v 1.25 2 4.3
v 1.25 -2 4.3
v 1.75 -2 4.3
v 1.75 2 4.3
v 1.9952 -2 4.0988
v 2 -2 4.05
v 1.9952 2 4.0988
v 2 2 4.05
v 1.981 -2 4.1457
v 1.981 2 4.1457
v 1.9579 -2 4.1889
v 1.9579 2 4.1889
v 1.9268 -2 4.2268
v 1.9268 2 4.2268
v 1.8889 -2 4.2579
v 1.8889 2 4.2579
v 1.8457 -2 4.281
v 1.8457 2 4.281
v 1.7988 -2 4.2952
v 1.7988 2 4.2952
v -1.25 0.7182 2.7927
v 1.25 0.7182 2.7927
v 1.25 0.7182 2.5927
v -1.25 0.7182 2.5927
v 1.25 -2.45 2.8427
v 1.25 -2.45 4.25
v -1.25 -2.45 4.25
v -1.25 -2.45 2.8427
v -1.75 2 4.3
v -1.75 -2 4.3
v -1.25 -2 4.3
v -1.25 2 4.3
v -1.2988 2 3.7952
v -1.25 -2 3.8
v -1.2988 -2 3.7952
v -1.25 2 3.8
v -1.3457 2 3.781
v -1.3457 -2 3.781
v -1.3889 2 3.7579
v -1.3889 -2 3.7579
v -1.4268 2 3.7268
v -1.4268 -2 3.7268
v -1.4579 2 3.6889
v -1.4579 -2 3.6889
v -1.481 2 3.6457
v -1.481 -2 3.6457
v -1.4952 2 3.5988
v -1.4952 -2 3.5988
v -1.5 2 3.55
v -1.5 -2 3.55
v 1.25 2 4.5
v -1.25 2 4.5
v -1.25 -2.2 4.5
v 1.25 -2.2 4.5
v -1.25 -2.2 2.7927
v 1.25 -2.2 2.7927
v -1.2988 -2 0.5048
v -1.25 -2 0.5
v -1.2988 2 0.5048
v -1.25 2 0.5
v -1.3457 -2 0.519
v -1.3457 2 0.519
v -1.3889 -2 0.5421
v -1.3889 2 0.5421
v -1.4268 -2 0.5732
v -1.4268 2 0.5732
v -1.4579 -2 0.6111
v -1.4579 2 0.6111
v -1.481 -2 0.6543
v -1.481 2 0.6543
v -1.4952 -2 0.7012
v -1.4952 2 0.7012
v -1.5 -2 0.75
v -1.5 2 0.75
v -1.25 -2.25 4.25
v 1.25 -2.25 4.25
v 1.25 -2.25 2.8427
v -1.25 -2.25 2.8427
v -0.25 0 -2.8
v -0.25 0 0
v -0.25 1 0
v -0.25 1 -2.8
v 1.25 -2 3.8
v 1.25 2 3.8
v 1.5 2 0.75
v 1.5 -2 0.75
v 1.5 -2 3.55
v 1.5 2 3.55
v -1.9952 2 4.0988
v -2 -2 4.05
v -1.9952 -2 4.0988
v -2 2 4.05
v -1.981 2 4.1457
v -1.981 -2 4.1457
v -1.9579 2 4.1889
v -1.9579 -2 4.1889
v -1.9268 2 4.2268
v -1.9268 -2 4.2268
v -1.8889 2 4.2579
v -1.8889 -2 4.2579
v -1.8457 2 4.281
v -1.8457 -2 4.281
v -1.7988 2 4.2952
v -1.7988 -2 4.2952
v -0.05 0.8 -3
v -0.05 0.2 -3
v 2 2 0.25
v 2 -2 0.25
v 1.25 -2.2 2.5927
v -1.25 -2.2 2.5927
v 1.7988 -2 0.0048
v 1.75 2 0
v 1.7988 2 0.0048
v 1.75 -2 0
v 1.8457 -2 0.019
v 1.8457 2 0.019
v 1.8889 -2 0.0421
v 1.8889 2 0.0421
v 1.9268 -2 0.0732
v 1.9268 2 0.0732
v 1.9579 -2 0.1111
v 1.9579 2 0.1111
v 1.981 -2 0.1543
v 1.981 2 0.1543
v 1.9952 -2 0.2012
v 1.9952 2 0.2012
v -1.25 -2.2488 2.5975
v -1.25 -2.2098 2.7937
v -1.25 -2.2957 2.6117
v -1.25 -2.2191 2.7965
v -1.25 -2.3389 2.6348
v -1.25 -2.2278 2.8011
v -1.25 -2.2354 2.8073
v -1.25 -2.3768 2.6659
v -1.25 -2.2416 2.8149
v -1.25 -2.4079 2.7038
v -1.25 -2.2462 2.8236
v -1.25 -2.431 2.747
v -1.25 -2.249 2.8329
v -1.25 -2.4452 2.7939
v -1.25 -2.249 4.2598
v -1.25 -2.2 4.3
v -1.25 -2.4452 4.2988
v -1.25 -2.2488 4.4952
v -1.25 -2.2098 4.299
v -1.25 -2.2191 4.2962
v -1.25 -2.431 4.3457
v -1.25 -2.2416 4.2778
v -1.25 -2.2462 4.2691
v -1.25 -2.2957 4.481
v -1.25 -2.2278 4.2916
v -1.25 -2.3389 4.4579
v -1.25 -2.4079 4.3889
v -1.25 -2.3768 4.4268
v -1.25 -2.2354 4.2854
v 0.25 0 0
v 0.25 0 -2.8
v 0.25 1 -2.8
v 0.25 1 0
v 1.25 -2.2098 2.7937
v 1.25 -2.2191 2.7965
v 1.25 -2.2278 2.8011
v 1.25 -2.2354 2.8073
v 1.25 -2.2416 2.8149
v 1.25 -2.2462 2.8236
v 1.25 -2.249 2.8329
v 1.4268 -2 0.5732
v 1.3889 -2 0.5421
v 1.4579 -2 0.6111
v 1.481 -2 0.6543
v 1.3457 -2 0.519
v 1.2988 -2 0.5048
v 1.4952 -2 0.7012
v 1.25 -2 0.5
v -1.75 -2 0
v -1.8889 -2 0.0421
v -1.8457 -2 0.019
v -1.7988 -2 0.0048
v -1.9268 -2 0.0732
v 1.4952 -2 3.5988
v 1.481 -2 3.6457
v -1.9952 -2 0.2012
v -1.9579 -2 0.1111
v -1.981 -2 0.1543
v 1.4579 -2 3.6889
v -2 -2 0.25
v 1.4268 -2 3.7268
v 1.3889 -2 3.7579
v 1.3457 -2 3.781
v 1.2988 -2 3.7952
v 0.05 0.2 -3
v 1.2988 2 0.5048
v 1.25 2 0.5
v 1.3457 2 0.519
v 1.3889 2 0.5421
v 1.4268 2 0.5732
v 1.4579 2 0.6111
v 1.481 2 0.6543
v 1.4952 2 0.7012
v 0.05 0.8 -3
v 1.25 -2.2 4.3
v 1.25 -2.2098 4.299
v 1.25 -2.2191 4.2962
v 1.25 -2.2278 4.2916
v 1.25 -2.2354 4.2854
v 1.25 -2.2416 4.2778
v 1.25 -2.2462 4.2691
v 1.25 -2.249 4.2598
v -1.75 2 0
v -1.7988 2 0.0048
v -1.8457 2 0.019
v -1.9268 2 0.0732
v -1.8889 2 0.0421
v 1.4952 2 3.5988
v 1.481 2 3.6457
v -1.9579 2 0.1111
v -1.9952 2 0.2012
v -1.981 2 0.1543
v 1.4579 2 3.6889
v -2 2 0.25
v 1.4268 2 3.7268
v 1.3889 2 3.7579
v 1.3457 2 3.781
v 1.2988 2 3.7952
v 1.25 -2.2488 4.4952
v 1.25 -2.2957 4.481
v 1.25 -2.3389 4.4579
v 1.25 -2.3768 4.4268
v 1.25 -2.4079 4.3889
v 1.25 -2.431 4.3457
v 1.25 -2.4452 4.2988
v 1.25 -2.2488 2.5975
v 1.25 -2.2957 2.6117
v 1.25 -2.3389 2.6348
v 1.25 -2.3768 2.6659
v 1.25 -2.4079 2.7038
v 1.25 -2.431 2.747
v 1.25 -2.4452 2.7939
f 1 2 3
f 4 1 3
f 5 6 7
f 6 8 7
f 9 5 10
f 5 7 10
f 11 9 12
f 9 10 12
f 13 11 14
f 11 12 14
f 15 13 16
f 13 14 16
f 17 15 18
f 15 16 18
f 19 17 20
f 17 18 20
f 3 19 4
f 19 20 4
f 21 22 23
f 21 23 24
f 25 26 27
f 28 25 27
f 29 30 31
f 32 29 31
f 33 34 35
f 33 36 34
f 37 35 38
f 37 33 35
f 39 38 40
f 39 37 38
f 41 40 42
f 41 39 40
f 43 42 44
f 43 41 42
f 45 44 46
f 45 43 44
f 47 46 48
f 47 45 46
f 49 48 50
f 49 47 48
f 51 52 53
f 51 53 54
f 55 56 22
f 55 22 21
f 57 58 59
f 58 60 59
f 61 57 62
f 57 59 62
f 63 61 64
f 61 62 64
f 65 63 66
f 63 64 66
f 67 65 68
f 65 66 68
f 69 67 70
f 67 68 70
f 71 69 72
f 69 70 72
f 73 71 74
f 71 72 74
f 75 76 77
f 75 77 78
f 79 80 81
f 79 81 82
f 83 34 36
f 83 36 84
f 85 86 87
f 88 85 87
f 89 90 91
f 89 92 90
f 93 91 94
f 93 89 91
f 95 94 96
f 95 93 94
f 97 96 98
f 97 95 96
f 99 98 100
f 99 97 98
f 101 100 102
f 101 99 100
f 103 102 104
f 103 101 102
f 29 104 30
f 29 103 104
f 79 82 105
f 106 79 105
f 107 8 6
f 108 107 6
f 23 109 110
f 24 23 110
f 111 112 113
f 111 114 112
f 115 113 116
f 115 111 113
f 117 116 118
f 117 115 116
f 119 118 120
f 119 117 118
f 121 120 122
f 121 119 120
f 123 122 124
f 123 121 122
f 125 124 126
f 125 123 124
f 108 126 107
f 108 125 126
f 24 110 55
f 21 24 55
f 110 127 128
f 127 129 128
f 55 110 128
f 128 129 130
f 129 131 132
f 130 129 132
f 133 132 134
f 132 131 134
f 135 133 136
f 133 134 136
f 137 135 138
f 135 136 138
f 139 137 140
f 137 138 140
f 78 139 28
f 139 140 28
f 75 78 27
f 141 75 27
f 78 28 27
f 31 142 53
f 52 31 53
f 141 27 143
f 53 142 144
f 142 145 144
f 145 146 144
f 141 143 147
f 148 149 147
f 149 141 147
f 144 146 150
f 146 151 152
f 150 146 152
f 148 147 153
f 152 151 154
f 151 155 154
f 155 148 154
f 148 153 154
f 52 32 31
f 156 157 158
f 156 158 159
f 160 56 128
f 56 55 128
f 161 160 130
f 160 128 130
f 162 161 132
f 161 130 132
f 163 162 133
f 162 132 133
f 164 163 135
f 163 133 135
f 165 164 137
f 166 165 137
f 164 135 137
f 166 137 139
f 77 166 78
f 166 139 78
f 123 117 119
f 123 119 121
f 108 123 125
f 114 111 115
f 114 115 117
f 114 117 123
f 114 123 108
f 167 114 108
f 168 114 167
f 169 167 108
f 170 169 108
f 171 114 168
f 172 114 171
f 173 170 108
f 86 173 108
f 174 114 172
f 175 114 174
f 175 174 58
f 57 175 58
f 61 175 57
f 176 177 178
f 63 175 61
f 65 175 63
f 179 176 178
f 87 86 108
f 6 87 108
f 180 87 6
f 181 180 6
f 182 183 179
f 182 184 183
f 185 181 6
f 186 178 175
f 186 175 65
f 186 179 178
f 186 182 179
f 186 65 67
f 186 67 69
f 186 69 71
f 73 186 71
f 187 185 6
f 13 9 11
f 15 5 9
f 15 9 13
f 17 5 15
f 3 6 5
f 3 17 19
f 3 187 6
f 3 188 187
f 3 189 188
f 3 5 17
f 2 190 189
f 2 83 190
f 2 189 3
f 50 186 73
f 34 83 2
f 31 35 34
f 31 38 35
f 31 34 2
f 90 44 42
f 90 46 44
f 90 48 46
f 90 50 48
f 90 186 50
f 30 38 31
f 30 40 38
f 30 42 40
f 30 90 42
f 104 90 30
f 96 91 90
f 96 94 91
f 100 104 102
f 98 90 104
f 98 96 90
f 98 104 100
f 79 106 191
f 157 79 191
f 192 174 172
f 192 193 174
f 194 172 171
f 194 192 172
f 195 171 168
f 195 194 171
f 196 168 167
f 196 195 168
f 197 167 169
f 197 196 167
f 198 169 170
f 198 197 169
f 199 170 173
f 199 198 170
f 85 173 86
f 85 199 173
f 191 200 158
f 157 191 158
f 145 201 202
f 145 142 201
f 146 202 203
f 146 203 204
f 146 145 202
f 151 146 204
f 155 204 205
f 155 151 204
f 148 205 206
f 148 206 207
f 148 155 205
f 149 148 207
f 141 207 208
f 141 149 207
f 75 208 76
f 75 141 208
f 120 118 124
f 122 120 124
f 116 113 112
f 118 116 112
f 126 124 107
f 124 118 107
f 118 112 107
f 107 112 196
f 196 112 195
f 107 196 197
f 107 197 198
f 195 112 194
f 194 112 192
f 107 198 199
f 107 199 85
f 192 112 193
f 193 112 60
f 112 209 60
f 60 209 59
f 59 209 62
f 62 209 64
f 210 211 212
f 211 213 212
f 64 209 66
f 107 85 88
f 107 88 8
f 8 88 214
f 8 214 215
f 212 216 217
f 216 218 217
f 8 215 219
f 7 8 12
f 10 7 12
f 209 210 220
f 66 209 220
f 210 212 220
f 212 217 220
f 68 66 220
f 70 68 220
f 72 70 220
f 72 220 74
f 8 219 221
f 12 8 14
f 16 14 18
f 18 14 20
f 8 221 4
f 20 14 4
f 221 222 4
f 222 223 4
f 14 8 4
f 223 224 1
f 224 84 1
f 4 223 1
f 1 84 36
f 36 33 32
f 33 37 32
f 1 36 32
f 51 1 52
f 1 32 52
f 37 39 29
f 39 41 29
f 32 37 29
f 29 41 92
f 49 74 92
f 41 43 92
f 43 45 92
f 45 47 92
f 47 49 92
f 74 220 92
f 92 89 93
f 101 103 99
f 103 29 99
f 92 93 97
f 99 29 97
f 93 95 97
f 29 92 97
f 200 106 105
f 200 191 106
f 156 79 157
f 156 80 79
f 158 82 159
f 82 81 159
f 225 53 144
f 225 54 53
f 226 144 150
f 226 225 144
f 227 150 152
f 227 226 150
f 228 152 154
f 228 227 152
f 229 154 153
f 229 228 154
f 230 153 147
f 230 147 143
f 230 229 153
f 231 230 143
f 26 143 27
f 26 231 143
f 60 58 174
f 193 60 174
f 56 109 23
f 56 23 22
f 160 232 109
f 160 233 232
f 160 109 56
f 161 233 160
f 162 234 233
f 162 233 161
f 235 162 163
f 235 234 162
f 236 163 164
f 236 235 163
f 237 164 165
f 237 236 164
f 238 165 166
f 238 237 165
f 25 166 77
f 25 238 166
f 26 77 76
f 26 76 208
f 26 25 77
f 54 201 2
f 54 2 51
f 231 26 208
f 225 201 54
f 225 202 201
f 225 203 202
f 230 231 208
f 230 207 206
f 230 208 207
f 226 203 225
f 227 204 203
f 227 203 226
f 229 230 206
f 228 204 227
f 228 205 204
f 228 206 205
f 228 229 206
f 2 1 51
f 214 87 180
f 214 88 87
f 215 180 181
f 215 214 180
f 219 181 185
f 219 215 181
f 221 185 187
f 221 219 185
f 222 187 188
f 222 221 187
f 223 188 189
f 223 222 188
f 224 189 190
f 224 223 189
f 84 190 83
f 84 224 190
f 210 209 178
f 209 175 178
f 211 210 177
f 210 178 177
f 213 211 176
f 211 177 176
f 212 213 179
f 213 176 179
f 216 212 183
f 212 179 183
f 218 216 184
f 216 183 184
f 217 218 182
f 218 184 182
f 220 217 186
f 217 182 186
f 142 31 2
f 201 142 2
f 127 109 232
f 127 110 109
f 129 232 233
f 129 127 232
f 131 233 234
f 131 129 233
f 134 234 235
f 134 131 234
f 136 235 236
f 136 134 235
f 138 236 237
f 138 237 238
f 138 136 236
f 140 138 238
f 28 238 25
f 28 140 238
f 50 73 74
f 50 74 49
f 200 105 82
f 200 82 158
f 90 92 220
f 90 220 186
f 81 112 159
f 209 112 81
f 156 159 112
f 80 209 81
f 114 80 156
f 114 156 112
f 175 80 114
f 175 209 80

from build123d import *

# Parameters (mm, degrees)
SKETCH_1_W          = 4
SKETCH_1_H          = 4.5
EXTRUDE_1_DEPTH     = 4
SKETCH_2_W          = 0.75
SKETCH_2_H          = 0.2
CUT_EXTRUDE_1_DEPTH = 7.34428877
SKETCH_3_W          = 0.75
SKETCH_3_H          = 0.2
CUT_EXTRUDE_2_DEPTH = 4
SKETCH_4_W          = 2.5
SKETCH_4_H          = 0.2
EXTRUDE_2_DEPTH     = 0.45
SKETCH_5_W          = 2.5
SKETCH_5_H          = 0.2
EXTRUDE_3_DEPTH     = 1.707300918
SKETCH_6_W          = 3
SKETCH_6_H          = 3.3
CUT_EXTRUDE_3_DEPTH = 7.34428877
SKETCH_7_W          = 2.5
SKETCH_7_H          = 0.2
EXTRUDE_4_DEPTH     = 2.968221289
EXTRUDE_5_DEPTH     = 1
CHAMFER_1_SIZE      = 0.070710678
FILLET_1_R          = 0.05
CHAMFER_2_SIZE      = 0.2
FILLET_2_R          = 0.25


with BuildPart() as part:
    # Эскиз1 → Бобышка-Вытянуть1 (new body)
    with BuildSketch(Plane(origin=(-2, 0, 0), x_dir=(0, -1, 0), z_dir=(-1, 0, 0))):
        with Locations((0, 2.25)):
            Rectangle(SKETCH_1_W, SKETCH_1_H)
    extrude(amount=-EXTRUDE_1_DEPTH)

    # Эскиз2 → Вырез-Вытянуть1 (cut, through all)
    with BuildSketch(Plane.XZ.offset(2)):
        with Locations((-1.625, 4.4)):
            Rectangle(SKETCH_2_W, SKETCH_2_H)
    extrude(amount=-CUT_EXTRUDE_1_DEPTH, mode=Mode.SUBTRACT)

    # Эскиз3 → Вырез-Вытянуть2 (cut)
    with BuildSketch(Plane.XZ.offset(2)):
        with Locations((1.625, 4.4)):
            Rectangle(SKETCH_3_W, SKETCH_3_H)
    extrude(amount=-CUT_EXTRUDE_2_DEPTH, mode=Mode.SUBTRACT)

    # Эскиз4 → Бобышка-Вытянуть2 (add)
    with BuildSketch(Plane.XZ.offset(2)):
        with Locations((0, 4.4)):
            Rectangle(SKETCH_4_W, SKETCH_4_H)
    extrude(amount=EXTRUDE_2_DEPTH)

    # Эскиз5 → Бобышка-Вытянуть3 (add)
    with BuildSketch(Plane(origin=(0, 0, 4.3), x_dir=(-1, 0, 0), z_dir=(0, 0, -1))):
        with Locations((0, -2.35)):
            Rectangle(SKETCH_5_W, SKETCH_5_H)
    extrude(amount=EXTRUDE_3_DEPTH)

    # Эскиз6 → Вырез-Вытянуть3 (cut, through all)
    with BuildSketch(Plane.XZ.offset(2)):
        with Locations((0, 2.15)):
            Rectangle(SKETCH_6_W, SKETCH_6_H)
    extrude(amount=-CUT_EXTRUDE_3_DEPTH, mode=Mode.SUBTRACT)

    # Эскиз7 → Бобышка-Вытянуть4 (add)
    with BuildSketch(Plane(origin=(0, -2.25, 0), x_dir=(-1, 0, 0), z_dir=(0, 1, 0))):
        with Locations((0, 2.692699082)):
            Rectangle(SKETCH_7_W, SKETCH_7_H)
    extrude(amount=EXTRUDE_4_DEPTH)

    # Эскиз8 → Бобышка-Вытянуть5 (add)
    with BuildSketch(Plane.XZ):
        Polygon((-0.25, 0), (-0.25, -2.8), (0, -3.05), (0.25, -2.8), (0.25, 0), align=None)
    extrude(amount=-EXTRUDE_5_DEPTH)

    # Фаска1
    chamfer_1_edges = [part.edges().sort_by_distance(p)[0] for p in [
        (0, 0.5, -3.05),
    ]]
    chamfer(chamfer_1_edges, length=CHAMFER_1_SIZE)

    # Скругление1
    fillet_1_edges = [part.edges().sort_by_distance(p)[0] for p in [
        (0, -2.25, 4.3),
        (0, -2.25, 2.792699082),
    ]]
    fillet(fillet_1_edges, radius=FILLET_1_R)

    # Фаска2
    chamfer_2_edges = [part.edges().sort_by_distance(p)[0] for p in [
        (0, 1, -3),
        (0, 0, -3),
    ]]
    chamfer(chamfer_2_edges, length=CHAMFER_2_SIZE)

    # Скругление2
    fillet_2_edges = [part.edges().sort_by_distance(p)[0] for p in [
        (2, 0, 0),
        (-2, 0, 4.3),
        (2, 0, 4.3),
        (0, -2.45, 4.5),
        (-2, 0, 0),
        (0, -2.45, 2.592699082),
        (-1.5, 0, 0.5),
        (-1.5, 0, 3.8),
        (1.5, 0, 3.8),
        (1.5, 0, 0.5),
    ]]
    fillet(fillet_2_edges, radius=FILLET_2_R)


solid = part.part
